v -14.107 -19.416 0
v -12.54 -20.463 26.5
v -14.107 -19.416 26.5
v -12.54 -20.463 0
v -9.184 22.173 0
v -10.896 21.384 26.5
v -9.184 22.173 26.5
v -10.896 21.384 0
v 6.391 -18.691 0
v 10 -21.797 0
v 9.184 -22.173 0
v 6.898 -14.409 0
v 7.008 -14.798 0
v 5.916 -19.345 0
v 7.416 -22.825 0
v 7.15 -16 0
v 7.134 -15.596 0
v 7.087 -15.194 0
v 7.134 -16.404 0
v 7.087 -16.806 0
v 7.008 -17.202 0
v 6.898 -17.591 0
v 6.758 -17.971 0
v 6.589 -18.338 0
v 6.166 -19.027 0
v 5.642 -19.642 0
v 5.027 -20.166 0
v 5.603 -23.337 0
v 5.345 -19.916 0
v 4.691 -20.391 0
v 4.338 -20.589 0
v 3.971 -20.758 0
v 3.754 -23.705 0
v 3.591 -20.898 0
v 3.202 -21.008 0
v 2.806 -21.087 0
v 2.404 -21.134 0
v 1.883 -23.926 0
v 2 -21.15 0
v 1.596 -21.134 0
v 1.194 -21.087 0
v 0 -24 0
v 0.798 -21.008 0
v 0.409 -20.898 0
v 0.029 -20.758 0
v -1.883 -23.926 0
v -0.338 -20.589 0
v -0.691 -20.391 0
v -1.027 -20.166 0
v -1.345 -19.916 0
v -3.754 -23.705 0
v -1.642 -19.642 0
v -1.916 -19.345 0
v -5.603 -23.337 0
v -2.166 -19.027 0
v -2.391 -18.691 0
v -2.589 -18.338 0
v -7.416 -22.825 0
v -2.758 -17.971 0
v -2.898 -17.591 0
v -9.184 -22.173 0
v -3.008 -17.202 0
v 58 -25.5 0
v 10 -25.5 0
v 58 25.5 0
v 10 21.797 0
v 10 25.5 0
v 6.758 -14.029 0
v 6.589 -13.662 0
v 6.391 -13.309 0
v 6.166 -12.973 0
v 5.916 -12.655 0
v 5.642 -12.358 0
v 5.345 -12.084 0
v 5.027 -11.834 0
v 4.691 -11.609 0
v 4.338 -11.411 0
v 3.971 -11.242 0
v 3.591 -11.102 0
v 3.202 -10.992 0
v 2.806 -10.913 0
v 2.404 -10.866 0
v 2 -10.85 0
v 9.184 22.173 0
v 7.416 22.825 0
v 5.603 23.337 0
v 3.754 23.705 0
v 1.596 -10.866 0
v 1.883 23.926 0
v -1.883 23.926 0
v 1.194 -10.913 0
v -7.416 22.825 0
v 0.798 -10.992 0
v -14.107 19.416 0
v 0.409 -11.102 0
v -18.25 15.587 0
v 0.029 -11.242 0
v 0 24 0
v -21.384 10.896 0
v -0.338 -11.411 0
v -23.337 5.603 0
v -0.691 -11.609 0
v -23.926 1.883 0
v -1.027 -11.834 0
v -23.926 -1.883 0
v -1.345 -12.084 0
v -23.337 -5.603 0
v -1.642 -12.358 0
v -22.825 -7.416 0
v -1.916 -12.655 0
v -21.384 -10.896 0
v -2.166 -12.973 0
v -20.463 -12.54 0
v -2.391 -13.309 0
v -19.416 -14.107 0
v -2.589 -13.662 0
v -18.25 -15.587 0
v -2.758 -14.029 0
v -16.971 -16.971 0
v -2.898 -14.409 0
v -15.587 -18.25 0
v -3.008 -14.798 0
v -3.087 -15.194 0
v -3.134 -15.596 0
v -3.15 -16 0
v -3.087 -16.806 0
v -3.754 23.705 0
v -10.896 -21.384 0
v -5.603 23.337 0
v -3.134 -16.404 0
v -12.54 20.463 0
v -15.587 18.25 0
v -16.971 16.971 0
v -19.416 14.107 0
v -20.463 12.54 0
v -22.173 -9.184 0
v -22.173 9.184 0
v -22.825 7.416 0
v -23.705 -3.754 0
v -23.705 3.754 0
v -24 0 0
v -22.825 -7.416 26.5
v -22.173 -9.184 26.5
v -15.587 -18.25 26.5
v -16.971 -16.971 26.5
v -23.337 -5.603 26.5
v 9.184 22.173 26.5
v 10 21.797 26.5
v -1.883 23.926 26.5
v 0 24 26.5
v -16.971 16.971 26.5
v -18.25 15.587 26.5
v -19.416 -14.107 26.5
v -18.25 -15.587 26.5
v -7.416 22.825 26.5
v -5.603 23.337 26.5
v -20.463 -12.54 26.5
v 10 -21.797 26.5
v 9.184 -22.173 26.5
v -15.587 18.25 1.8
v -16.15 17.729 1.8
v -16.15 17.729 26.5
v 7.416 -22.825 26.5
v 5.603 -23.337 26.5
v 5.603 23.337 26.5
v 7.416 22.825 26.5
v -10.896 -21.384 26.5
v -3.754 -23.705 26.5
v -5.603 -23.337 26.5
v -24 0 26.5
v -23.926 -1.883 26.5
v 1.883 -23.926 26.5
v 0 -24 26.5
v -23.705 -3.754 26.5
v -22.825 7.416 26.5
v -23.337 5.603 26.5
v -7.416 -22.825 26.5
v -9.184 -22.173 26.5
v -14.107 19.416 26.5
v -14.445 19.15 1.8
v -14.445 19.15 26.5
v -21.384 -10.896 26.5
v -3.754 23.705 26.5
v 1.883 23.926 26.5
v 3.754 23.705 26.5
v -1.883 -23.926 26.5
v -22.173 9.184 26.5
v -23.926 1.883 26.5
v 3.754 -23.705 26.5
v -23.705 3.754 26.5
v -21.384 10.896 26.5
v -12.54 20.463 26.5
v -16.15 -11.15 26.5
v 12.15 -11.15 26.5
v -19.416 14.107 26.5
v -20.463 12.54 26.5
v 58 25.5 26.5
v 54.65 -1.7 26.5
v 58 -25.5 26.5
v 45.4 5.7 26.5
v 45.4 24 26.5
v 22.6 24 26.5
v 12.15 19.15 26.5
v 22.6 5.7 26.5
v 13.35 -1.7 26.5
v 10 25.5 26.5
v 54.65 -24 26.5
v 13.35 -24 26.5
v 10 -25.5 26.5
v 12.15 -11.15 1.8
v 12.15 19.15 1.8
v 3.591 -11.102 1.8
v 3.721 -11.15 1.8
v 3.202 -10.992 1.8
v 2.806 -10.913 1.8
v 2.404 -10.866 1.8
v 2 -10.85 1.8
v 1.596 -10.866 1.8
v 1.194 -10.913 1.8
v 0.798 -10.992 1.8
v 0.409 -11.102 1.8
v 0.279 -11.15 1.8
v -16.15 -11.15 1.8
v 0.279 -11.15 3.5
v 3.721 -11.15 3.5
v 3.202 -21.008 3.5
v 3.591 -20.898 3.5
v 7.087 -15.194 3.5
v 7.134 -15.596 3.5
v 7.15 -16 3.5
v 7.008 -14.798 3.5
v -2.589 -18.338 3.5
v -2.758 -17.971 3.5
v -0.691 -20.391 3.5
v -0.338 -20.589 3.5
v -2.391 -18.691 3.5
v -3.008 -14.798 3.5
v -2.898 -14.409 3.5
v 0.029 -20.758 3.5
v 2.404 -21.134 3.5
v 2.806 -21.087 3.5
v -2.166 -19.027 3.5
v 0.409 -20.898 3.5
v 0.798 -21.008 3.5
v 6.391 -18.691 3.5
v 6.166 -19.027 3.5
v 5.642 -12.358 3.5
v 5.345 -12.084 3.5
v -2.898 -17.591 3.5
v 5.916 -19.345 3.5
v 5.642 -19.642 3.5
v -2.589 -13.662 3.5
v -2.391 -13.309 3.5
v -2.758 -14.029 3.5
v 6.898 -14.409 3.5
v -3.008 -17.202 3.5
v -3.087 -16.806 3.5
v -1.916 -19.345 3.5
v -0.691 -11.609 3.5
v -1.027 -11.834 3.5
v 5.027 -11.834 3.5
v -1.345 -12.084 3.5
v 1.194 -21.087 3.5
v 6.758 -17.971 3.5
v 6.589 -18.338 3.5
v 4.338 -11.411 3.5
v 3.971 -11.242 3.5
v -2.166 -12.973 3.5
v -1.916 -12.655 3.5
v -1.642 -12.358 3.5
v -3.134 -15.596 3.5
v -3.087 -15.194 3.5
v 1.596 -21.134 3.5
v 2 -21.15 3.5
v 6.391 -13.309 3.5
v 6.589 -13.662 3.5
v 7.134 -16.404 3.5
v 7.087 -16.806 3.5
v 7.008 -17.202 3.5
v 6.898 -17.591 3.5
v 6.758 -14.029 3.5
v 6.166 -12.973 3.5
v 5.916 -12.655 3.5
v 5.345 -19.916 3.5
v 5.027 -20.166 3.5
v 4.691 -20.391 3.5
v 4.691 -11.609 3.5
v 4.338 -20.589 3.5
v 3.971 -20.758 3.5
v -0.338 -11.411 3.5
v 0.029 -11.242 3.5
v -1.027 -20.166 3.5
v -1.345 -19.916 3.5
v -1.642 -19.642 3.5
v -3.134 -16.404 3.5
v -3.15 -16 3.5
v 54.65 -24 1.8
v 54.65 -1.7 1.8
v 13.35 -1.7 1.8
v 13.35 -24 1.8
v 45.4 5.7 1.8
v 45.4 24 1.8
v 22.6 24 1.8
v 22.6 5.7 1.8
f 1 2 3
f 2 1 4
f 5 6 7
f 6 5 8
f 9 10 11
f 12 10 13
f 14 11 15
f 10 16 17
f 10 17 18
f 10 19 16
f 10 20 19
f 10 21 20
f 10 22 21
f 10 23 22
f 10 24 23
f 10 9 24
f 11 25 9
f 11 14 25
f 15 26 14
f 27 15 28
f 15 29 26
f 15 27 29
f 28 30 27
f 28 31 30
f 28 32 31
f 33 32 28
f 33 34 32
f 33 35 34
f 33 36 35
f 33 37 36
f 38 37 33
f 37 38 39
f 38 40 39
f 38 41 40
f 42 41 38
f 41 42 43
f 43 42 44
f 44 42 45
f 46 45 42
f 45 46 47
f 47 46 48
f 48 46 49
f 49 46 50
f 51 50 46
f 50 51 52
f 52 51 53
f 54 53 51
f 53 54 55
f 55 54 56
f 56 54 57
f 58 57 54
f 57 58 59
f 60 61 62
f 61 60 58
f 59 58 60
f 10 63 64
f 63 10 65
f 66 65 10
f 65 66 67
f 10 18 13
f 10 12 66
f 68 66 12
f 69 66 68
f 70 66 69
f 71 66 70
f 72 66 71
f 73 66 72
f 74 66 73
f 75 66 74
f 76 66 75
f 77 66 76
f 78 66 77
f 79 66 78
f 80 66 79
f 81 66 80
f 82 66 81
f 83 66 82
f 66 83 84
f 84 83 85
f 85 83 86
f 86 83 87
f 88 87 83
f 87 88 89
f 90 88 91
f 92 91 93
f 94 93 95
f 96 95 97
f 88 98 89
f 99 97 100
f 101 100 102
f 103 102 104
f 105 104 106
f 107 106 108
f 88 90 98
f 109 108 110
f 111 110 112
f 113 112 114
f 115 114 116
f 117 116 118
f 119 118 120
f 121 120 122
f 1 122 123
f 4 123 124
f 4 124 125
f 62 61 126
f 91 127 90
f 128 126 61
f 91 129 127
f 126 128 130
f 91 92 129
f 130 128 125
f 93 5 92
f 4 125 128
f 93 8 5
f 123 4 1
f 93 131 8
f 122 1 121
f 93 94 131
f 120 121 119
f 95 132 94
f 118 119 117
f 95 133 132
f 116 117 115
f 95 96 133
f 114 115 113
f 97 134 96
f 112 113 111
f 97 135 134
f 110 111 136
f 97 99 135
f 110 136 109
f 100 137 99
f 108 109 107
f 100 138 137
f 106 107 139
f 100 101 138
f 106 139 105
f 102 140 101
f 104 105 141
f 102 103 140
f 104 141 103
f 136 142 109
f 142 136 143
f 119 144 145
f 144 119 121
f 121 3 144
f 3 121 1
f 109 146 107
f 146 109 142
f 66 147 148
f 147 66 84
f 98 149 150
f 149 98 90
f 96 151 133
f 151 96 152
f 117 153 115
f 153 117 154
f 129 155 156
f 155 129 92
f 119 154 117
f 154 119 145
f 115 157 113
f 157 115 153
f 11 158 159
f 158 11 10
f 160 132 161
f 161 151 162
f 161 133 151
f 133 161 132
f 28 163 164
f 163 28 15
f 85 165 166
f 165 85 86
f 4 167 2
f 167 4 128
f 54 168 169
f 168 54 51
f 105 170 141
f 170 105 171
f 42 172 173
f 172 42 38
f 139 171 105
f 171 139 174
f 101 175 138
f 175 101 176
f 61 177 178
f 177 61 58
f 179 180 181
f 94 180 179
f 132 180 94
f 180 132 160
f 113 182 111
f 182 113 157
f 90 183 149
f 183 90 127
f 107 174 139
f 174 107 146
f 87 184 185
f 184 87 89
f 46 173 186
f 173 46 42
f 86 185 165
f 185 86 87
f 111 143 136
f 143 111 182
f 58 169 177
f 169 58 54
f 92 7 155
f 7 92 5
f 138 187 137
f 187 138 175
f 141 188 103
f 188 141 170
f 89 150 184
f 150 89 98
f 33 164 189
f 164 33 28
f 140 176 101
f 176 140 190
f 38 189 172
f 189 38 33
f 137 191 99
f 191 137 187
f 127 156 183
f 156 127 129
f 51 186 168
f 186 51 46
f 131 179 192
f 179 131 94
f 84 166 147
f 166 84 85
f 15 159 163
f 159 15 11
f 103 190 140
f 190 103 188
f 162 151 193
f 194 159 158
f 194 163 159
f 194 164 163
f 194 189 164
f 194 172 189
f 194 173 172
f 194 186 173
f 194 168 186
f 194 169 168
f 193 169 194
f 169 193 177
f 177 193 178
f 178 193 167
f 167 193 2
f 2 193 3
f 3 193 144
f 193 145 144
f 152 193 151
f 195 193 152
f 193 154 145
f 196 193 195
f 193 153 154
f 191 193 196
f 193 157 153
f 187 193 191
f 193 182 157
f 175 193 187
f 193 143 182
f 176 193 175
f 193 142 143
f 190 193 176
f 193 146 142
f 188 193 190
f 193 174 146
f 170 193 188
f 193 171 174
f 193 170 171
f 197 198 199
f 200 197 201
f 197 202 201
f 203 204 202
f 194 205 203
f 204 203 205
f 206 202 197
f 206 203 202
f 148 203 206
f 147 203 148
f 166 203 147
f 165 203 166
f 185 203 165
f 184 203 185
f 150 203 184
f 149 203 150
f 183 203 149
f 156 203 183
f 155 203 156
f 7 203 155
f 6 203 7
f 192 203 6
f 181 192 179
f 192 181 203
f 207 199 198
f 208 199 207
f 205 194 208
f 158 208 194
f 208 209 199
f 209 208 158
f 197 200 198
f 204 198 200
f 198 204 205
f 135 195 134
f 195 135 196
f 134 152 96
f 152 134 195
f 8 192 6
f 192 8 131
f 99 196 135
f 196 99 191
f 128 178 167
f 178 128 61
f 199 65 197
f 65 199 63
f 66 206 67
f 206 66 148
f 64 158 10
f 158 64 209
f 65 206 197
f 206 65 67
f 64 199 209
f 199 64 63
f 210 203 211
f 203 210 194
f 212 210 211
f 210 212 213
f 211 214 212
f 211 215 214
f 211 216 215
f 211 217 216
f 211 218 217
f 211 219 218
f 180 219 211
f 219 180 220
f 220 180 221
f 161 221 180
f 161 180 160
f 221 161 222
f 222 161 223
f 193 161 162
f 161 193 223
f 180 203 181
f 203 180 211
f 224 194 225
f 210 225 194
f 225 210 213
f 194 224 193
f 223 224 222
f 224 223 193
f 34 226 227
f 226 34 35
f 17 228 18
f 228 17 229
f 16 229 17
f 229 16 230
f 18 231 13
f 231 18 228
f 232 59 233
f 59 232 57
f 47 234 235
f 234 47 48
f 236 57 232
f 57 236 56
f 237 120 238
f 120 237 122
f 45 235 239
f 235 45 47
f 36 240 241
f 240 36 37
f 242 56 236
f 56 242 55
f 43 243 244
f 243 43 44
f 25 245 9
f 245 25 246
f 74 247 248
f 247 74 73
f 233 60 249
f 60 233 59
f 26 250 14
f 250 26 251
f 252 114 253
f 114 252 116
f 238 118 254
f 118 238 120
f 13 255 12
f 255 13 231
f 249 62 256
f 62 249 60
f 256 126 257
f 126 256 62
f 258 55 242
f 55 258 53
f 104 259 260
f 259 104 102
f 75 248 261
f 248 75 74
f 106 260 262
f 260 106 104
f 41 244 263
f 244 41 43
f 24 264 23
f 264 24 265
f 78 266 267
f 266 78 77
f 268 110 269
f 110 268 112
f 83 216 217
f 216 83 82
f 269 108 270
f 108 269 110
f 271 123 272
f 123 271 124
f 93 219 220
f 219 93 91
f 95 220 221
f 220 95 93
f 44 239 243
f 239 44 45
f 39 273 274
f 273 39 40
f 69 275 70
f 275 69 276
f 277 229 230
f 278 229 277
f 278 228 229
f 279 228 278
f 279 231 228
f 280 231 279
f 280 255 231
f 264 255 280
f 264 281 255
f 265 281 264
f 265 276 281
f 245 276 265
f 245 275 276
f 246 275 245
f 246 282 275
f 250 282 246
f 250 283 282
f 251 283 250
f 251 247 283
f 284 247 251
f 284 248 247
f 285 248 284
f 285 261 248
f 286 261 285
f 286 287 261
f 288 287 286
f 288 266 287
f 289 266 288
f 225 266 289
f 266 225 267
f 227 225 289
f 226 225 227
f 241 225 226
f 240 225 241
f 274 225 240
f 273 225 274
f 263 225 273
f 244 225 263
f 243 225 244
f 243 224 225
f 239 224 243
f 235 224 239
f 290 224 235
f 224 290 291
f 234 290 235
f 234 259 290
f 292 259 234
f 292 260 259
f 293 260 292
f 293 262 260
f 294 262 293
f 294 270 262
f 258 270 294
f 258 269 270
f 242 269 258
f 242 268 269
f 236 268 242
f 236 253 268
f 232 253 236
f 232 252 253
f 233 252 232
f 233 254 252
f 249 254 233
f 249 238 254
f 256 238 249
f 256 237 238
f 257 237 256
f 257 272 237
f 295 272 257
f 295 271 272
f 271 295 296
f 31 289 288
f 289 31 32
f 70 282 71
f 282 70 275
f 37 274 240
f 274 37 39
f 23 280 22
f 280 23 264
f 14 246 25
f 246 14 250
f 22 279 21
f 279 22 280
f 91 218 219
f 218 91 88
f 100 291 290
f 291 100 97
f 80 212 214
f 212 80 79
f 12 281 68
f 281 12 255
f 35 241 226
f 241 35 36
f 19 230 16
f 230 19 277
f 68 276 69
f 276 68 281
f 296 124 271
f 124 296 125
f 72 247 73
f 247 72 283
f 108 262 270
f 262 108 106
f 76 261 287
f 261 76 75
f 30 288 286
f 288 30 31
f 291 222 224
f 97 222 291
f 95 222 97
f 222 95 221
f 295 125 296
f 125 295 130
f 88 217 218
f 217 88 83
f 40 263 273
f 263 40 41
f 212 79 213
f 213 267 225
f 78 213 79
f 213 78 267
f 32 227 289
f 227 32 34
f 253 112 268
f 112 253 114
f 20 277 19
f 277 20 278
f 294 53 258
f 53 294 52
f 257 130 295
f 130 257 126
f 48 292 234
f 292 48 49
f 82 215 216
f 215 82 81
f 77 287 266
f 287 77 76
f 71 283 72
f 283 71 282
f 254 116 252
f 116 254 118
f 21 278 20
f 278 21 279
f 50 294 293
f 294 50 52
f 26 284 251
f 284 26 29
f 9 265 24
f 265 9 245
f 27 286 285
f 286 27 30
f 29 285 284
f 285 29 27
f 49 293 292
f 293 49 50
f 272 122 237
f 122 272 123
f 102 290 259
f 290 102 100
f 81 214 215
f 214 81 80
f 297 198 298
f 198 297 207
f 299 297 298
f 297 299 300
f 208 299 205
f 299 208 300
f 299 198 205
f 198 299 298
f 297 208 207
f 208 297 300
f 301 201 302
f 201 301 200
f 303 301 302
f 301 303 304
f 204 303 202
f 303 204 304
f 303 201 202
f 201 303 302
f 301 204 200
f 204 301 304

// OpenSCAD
// ============================================================
//  Wrist-Puck Keyhole Enclosure — First Draft
//  Rev 1.0  |  July 2026  |  Sean (Whitehorse, YT)
//
//  Replaces the circular puck (wrist_puck_enclosure_5_0.scad) with
//  a keyhole silhouette: a round chamber (servo + arm + LRA) joined
//  to an elongated rectangular body (battery/DRV/PowerBoost stack +
//  XIAO/IMU stack), sized against Sean's actual wrist (53mm wide x
//  35mm thick where the watch sits) rather than a fixed diameter
//  that didn't fit.
//
//  Component numbers below are Sean's own measurements from this
//  session, not the earlier file's assumed values -- several
//  changed (battery is 9mm thick now, not 6mm; servo+arm sweep is
//  28x30mm, not just the 21.5x25.1mm body; PowerBoost/XIAO/IMU all
//  slightly different from the rev5 assumptions). Reused without
//  change: WALL, FLOOR_T, LID_T, CLEARANCE, CAP_T, SNAP_* from
//  wrist_puck_enclosure_5_0.scad -- no reason to re-derive numbers
//  that were already validated there.
//
//  FIRST-PASS FLAGS -- explicit, not buried in comments:
//    - RECT_W (51mm) against Sean's 53mm wrist width leaves only
//      ~1mm clearance per side. That's tight. A real dry-fit is not
//      optional here the way it was borderline-optional elsewhere.
//    - Servo pocket fits chamber inner radius with ~1mm margin --
//      also tight. If the actual arm sweep needs clearance beyond
//      the bounding rectangle, this will need revisiting.
//    - LRA position is a placement guess, not derived from a known
//      arm-sweep direction -- flagged in-line below.
//    - No snap tabs, USB-C cutout, or standoff posts yet -- this
//      draft establishes the outer silhouette and the two internal
//      cavities are load-bearing; those details are next-pass.
//    - No lid/cap yet -- bottom shell only, to get the harder shape
//      right first.
// ============================================================

// ── SHARED CONSTANTS (unchanged from wrist_puck_enclosure_5_0) ──
WALL      = 2.2;
FLOOR_T   = 2.0;
LID_T     = 1.8;
CLEARANCE = 0.3;
CAP_T     = 2.0;

$fn = 80;

// ── OUTER SILHOUETTE ─────────────────────────────────────────
// X = along the forearm (0 = chamber center, increasing toward
//     the rectangular body / strap end)
// Y = across the wrist (must stay under ~53mm total)
// Z = vertical, floor at Z=0, same convention as the circular puck

CHAMBER_D = 48;   // round chamber outer diameter
CHAMBER_R = CHAMBER_D / 2;

RECT_L = 48;    // rectangular body outer length (along arm)
RECT_W = 51;    // rectangular body outer width (across arm) --
                 // SEE FIRST-PASS FLAG ABOVE: tight against 53mm wrist
RECT_X0 = 10;   // where the rectangle starts, overlapping into the
                 // chamber circle for a continuous keyhole silhouette

module outer_silhouette(h) {
    union() {
        cylinder(h = h, d = CHAMBER_D);
        translate([RECT_X0, -RECT_W/2, 0])
            cube([RECT_L, RECT_W, h]);
    }
}

// ── SERVO + ARM (chamber) ────────────────────────────────────
// Sean's measured footprint: 28 x 30mm to the end of the arm swing
// (bounding box, not the bare servo body) x 12mm height.
SERVO_W = 28.0 + CLEARANCE;
SERVO_D = 30.0 + CLEARANCE;
SERVO_H = 12.0 + CLEARANCE;
SERVO_CX = -2;   // roughly centered in the chamber; not yet
SERVO_CY = 4;    // finalized against actual arm swing direction

// ── LRA ───────────────────────────────────────────────────────
// FIRST-PASS PLACEMENT GUESS: tucked into the chamber's leftover
// crescent space, away from the servo footprint above. Needs
// verification once the servo's actual mounting orientation (which
// way the arm swings) is fixed -- it's placed clear of the servo's
// bounding box as currently assumed, not clear of the real swept
// arc if that's smaller than the bounding box suggests.
LRA_DIAM = 10.0 + CLEARANCE;
LRA_H    = 3.5;
LRA_CX   = 2;
LRA_CY   = -16;

// ── POWER STACK (battery / DRV / PowerBoost) ─────────────────
// Stacks in Z exactly like the circular puck did -- same X/Y
// center for all three, different heights. Footprint is the
// battery's own (the largest of the three).
BATT_W = 22.0 + CLEARANCE;   // Sean's measured 22mm (incl. shim/tape)
BATT_D = 41.0 + CLEARANCE;
BATT_H = 9.0;                 // measured, incl. shim/foam/kapton tape

DRV_W = 19.0 + CLEARANCE;
DRV_D = 25.0 + CLEARANCE;
DRV_H = 4.0;

PB_W = 22.0 + CLEARANCE;
PB_D = 36.0 + CLEARANCE;      // Sean's remeasure, was 37 in rev5
PB_H = 7.5;

PWR_CX = RECT_X0 + RECT_L/2;      // roughly centered along the rectangle
PWR_CY = -(RECT_W/2 - BATT_W/2 - 1.5);  // offset to one side, 1.5mm margin off the wall

// ── COMPUTE STACK (XIAO / IMU) ────────────────────────────────
// Also stacks in Z -- XIAO on the floor, IMU on top of it.
// IMU is the header-less 601N1 module: 20.6 x 17.8 x 3mm.
XIAO_W = 22.5 + CLEARANCE;
XIAO_D = 18.0 + CLEARANCE;
XIAO_H = 4.5;

IMU_W = 20.6 + CLEARANCE;
IMU_D = 17.8 + CLEARANCE;
IMU_H = 3.0;   // header-less, per Sean's measurement

CPU_CX = PWR_CX;                              // same X-center as power stack
// Y-offset must use XIAO_D (18.3mm, the across-wrist cube dimension
// below), not XIAO_W -- XIAO_W is the along-arm dimension here since
// its cube is [XIAO_W, XIAO_D, ...], long-side-on-X, same convention
// as the (now-fixed) power stack.
CPU_CY = (RECT_W/2 - XIAO_D/2 - 1.5);

// ── SHARED CAVITY MODULES ────────────────────────────────────
// Each takes cut_top_z (absolute Z height to cut up to) so both
// bottom_shell() (full height) and floorplan.scad's shallow test
// tray (via use<>, calling these same modules at a small cut_top_z)
// share the exact same XY footprint logic. No duplicated numbers,
// no variable-scoping fights -- learned the hard way that neither
// plain nor $-prefixed variable overrides survive OpenSCAD's
// duplicate-assignment resolution across an include<>, even with
// an is_undef() guard. Modules ARE importable via use<>, so this
// sidesteps the whole problem structurally instead.
module servo_cavity(cut_top_z) {
    translate([SERVO_CX, SERVO_CY, (FLOOR_T - 0.2 + cut_top_z)/2])
        cube([SERVO_W, SERVO_D, cut_top_z - (FLOOR_T - 0.2)], center = true);
}

module lra_cavity() {
    // opens through the BOTTOM, not the top -- correct as a short
    // cavity regardless of caller, no cut_top_z parameter needed
    translate([LRA_CX, LRA_CY, -0.2])
        cylinder(h = LRA_H + 0.2, d = LRA_DIAM);
}

module power_cavity(cut_top_z) {
    translate([PWR_CX, PWR_CY, (FLOOR_T - 0.2 + cut_top_z)/2])
        cube([BATT_D, BATT_W, cut_top_z - (FLOOR_T - 0.2)], center = true);
}

module compute_cavity(cut_top_z) {
    translate([CPU_CX, CPU_CY, (FLOOR_T - 0.2 + cut_top_z)/2])
        cube([XIAO_W, XIAO_D, cut_top_z - (FLOOR_T - 0.2)], center = true);
}

// ── BOTTOM SHELL ───────────────────────────────────────────────
module bottom_shell() {
    // Shell height must clear the TALLEST cavity, not just the
    // servo -- the power stack (battery+DRV+PowerBoost, 20.5mm) is
    // taller than the servo pocket (12.3mm). Missed this on the
    // first pass through this file; caught before rendering, not
    // after.
    power_stack_h = BATT_H + DRV_H + PB_H;
    tallest = max(SERVO_H, power_stack_h, XIAO_H + IMU_H);
    shell_h = FLOOR_T + tallest + 4;   // 4mm margin for lid/wall clearance

    difference() {
        outer_silhouette(shell_h);

        // All three cavities must reach the TOP of the shell (open,
        // not a sealed void) -- components need to go in from above,
        // and a lid (not yet built) will close over the top later.
        // The real bug on earlier passes: each cavity only extended to
        // its OWN component height + a small overshoot, which fell
        // well short of shell_h. Every cavity was therefore a fully
        // enclosed void, sealed on all sides -- no way to insert a
        // battery into a bubble with no opening. Fixed by overshooting
        // every cavity's top past shell_h, via cut_top_z = shell_h+1.
        servo_cavity(shell_h + 1);
        lra_cavity();
        power_cavity(shell_h + 1);
        compute_cavity(shell_h + 1);
    }
}

bottom_shell();
